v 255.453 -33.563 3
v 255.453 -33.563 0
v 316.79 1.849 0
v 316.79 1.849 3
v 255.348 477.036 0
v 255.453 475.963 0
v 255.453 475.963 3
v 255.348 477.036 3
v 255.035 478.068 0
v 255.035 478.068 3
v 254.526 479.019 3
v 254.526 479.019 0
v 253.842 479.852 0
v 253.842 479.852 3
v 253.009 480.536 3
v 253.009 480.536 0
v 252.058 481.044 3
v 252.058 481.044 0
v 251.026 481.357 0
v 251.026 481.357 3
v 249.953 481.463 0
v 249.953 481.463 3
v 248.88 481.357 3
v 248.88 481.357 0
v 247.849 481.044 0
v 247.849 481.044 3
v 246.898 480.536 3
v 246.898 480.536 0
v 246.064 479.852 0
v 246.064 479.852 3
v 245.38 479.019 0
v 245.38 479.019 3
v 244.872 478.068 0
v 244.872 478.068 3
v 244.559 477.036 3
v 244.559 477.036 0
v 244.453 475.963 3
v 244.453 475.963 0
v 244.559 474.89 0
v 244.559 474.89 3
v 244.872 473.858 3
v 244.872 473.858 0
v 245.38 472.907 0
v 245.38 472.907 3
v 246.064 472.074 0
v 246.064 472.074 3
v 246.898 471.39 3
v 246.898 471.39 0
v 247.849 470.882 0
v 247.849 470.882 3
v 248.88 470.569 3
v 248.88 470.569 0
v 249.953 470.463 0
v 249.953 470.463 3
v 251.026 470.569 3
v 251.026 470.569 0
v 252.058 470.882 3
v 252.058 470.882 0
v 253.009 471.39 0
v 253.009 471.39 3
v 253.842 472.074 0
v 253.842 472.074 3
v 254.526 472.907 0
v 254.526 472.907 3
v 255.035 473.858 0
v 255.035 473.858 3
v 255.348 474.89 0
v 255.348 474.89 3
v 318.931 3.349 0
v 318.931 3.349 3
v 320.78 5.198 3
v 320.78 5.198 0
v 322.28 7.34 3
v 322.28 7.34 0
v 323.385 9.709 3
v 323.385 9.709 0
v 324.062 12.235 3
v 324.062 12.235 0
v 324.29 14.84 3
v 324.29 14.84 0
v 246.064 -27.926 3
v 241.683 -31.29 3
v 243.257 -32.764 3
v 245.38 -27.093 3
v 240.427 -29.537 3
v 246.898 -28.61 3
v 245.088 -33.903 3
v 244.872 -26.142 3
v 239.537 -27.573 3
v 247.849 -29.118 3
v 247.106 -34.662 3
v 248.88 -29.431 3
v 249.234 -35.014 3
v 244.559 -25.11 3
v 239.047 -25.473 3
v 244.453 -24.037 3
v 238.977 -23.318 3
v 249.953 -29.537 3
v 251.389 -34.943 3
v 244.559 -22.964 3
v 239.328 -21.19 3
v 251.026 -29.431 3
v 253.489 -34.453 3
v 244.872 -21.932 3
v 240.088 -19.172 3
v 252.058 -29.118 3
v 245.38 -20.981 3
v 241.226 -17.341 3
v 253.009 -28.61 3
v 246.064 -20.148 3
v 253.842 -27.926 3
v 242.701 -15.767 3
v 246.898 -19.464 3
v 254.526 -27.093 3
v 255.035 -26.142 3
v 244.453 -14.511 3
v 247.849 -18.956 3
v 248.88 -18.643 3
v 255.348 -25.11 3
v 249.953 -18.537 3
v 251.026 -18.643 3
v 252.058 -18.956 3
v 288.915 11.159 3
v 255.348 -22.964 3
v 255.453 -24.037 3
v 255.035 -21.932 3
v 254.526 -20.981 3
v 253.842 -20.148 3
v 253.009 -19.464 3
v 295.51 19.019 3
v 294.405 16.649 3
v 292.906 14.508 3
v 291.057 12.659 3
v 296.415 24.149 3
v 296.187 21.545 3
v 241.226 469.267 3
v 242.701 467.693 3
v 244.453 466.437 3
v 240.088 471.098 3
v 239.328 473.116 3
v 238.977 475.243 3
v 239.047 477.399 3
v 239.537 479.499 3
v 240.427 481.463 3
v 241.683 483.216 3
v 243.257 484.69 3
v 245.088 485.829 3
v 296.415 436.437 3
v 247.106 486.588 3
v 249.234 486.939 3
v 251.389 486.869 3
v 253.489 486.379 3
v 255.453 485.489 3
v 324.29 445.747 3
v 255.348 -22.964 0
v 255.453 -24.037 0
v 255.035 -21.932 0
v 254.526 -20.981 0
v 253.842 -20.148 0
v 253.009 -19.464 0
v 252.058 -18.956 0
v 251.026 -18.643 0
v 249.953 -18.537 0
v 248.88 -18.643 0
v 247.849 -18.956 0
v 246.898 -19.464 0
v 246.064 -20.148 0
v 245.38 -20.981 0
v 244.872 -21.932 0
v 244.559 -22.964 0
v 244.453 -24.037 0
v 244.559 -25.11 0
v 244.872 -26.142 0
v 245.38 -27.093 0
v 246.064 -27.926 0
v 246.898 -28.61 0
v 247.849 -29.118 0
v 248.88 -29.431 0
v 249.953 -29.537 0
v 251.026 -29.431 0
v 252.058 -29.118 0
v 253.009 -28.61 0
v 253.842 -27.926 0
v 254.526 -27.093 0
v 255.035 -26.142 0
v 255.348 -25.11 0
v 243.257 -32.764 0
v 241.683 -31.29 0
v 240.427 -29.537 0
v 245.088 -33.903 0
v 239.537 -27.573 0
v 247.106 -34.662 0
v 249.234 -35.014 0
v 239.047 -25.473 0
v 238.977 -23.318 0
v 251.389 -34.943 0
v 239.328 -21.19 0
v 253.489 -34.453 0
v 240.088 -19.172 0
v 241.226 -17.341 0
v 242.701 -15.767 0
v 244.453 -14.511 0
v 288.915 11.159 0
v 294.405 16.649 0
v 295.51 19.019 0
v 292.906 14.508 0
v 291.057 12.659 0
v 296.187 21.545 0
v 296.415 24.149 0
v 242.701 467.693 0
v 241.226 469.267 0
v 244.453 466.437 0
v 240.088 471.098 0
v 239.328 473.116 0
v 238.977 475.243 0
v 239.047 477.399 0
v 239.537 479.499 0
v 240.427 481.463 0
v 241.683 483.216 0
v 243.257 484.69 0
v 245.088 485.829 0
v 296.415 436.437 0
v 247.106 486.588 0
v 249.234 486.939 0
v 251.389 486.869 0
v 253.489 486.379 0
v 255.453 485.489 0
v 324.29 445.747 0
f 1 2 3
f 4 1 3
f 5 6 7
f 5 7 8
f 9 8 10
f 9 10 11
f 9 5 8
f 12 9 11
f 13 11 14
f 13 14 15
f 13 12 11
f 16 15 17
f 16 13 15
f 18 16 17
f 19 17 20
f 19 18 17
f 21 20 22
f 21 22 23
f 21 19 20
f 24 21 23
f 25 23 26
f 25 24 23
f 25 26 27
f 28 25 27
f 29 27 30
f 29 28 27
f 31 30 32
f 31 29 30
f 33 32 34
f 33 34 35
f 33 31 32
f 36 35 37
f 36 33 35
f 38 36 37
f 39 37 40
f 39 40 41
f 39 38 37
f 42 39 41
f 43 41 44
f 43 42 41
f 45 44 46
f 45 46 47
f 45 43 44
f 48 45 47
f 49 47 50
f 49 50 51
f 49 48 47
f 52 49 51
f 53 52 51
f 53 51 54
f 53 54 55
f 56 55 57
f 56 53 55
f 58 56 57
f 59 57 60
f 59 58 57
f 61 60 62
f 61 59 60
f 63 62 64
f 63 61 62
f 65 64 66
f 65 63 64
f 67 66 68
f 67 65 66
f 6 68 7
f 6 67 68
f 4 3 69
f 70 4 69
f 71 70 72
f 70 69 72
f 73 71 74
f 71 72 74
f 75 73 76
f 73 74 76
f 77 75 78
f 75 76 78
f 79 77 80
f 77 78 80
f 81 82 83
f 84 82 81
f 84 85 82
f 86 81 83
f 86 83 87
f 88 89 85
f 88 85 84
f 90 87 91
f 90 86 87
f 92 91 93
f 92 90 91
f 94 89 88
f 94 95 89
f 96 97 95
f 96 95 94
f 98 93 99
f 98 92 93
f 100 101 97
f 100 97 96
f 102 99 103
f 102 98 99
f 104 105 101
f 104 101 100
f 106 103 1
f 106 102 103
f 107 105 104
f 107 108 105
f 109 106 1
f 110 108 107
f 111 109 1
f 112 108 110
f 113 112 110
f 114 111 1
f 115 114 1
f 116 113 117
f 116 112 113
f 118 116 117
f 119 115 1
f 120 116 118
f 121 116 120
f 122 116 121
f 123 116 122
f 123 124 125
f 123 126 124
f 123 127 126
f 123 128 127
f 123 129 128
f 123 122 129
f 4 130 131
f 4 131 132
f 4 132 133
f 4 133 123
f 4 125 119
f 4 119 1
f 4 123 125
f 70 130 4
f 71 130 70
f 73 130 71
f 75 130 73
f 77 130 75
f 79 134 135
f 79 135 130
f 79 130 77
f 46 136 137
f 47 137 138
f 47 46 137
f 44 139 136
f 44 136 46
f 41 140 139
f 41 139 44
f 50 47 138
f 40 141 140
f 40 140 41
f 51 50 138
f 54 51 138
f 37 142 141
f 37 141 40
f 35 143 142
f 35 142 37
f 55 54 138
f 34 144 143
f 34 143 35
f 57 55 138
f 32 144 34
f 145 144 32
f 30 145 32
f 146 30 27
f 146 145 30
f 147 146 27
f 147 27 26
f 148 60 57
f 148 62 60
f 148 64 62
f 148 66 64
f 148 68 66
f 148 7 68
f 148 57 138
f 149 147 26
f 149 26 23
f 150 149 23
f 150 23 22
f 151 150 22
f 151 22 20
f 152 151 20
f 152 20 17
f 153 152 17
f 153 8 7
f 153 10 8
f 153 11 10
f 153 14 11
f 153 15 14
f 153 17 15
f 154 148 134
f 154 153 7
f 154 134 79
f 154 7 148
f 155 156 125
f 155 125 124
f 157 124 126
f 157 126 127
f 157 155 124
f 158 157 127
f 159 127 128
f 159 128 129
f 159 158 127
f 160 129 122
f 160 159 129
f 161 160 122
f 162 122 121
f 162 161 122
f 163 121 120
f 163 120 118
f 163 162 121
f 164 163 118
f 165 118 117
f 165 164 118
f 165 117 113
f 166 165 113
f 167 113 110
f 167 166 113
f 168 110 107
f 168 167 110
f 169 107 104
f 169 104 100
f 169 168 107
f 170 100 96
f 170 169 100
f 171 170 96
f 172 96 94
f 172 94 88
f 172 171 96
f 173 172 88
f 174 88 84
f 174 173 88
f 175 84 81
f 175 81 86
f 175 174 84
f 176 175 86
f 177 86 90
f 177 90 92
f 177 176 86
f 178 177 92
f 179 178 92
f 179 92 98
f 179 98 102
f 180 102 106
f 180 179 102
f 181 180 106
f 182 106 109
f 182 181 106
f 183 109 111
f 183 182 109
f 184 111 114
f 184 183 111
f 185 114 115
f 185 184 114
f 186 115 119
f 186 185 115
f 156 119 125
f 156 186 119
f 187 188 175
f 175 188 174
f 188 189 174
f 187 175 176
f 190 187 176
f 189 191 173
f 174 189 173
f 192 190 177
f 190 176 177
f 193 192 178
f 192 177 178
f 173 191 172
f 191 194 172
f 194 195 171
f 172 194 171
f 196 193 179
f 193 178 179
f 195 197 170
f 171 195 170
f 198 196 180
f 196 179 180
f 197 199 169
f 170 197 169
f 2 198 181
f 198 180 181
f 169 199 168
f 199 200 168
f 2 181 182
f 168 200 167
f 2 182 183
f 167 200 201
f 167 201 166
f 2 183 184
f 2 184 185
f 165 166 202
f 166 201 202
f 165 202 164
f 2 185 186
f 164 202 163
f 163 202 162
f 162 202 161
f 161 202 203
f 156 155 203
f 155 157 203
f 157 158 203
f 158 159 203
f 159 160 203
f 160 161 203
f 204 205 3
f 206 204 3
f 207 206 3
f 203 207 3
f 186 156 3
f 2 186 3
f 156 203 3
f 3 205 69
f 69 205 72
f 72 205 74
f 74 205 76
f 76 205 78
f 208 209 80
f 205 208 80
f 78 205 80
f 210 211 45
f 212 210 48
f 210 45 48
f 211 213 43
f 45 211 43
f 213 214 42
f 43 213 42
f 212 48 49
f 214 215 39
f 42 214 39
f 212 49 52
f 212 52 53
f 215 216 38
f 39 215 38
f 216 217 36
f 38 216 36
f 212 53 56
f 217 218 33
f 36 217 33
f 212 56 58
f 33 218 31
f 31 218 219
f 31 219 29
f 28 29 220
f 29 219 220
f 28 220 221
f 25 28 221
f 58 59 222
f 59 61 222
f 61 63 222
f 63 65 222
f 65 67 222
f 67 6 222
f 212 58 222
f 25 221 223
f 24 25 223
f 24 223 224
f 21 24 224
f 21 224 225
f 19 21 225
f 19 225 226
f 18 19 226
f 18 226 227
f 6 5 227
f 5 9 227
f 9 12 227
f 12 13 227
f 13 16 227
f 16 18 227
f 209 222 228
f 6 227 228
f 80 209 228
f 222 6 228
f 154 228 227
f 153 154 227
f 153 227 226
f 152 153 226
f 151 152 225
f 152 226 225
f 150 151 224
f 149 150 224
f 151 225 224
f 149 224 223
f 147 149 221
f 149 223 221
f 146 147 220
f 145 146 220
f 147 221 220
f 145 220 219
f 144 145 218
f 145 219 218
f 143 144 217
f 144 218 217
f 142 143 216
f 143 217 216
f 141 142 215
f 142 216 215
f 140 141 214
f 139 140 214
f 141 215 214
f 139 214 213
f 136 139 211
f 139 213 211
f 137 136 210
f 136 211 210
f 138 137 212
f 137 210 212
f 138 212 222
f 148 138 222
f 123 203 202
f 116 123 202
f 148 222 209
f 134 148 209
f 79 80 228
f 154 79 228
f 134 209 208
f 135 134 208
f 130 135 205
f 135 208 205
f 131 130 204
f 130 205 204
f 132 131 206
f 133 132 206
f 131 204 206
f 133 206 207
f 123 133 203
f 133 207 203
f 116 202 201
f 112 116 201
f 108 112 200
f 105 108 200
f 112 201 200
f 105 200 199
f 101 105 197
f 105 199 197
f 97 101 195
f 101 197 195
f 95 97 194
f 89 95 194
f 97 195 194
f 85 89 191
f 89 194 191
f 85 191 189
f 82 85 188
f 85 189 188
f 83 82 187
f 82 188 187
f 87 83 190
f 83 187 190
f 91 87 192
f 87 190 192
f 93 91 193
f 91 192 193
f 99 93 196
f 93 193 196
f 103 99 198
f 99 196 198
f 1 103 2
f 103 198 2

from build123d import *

# Parameters (mm, degrees)
SKETCH_1_R      = 5.5
EXTRUDE_1_DEPTH = 3


with BuildPart() as part:
    # 草图1 → 凸台-拉伸1 (new body)
    with BuildSketch(Plane.XY):
        with BuildLine():
            Line((324.289682364, 18.881027034), (324.289682364, 433.044836172))
            Line((324.289682364, 433.044836172), (324.289682364, 445.746542094))
            Line((324.289682364, 445.746542094), (255.453360513, 485.489211044))
            ThreePointArc((255.453360513, 485.489211044), (240.427081072, 481.462931603), (244.453360513, 466.436652161))
            Line((244.453360513, 466.436652161), (296.41488474, 436.436652161))
            Line((296.41488474, 436.436652161), (296.41488474, 24.149465082))
            ThreePointArc((296.41488474, 24.149465082), (294.405265797, 16.649465082), (288.91488474, 11.159084025))
            Line((288.91488474, 11.159084025), (244.453360513, -14.510788956))
            ThreePointArc((244.453360513, -14.510788956), (240.427081072, -29.537068397), (255.453360513, -33.563347839))
            Line((255.453360513, -33.563347839), (316.789682364, 1.849194092))
            ThreePointArc((316.789682364, 1.849194092), (322.28006342, 7.339575149), (324.289682364, 14.839575149))
            Line((324.289682364, 14.839575149), (324.289682364, 18.881027034))
        make_face()
        with Locations((249.953360513, -24.037068397)):
            Circle(SKETCH_1_R, mode=Mode.SUBTRACT)
        with Locations((249.953360513, 475.962931603)):
            Circle(SKETCH_1_R, mode=Mode.SUBTRACT)
    extrude(amount=EXTRUDE_1_DEPTH)


solid = part.part
